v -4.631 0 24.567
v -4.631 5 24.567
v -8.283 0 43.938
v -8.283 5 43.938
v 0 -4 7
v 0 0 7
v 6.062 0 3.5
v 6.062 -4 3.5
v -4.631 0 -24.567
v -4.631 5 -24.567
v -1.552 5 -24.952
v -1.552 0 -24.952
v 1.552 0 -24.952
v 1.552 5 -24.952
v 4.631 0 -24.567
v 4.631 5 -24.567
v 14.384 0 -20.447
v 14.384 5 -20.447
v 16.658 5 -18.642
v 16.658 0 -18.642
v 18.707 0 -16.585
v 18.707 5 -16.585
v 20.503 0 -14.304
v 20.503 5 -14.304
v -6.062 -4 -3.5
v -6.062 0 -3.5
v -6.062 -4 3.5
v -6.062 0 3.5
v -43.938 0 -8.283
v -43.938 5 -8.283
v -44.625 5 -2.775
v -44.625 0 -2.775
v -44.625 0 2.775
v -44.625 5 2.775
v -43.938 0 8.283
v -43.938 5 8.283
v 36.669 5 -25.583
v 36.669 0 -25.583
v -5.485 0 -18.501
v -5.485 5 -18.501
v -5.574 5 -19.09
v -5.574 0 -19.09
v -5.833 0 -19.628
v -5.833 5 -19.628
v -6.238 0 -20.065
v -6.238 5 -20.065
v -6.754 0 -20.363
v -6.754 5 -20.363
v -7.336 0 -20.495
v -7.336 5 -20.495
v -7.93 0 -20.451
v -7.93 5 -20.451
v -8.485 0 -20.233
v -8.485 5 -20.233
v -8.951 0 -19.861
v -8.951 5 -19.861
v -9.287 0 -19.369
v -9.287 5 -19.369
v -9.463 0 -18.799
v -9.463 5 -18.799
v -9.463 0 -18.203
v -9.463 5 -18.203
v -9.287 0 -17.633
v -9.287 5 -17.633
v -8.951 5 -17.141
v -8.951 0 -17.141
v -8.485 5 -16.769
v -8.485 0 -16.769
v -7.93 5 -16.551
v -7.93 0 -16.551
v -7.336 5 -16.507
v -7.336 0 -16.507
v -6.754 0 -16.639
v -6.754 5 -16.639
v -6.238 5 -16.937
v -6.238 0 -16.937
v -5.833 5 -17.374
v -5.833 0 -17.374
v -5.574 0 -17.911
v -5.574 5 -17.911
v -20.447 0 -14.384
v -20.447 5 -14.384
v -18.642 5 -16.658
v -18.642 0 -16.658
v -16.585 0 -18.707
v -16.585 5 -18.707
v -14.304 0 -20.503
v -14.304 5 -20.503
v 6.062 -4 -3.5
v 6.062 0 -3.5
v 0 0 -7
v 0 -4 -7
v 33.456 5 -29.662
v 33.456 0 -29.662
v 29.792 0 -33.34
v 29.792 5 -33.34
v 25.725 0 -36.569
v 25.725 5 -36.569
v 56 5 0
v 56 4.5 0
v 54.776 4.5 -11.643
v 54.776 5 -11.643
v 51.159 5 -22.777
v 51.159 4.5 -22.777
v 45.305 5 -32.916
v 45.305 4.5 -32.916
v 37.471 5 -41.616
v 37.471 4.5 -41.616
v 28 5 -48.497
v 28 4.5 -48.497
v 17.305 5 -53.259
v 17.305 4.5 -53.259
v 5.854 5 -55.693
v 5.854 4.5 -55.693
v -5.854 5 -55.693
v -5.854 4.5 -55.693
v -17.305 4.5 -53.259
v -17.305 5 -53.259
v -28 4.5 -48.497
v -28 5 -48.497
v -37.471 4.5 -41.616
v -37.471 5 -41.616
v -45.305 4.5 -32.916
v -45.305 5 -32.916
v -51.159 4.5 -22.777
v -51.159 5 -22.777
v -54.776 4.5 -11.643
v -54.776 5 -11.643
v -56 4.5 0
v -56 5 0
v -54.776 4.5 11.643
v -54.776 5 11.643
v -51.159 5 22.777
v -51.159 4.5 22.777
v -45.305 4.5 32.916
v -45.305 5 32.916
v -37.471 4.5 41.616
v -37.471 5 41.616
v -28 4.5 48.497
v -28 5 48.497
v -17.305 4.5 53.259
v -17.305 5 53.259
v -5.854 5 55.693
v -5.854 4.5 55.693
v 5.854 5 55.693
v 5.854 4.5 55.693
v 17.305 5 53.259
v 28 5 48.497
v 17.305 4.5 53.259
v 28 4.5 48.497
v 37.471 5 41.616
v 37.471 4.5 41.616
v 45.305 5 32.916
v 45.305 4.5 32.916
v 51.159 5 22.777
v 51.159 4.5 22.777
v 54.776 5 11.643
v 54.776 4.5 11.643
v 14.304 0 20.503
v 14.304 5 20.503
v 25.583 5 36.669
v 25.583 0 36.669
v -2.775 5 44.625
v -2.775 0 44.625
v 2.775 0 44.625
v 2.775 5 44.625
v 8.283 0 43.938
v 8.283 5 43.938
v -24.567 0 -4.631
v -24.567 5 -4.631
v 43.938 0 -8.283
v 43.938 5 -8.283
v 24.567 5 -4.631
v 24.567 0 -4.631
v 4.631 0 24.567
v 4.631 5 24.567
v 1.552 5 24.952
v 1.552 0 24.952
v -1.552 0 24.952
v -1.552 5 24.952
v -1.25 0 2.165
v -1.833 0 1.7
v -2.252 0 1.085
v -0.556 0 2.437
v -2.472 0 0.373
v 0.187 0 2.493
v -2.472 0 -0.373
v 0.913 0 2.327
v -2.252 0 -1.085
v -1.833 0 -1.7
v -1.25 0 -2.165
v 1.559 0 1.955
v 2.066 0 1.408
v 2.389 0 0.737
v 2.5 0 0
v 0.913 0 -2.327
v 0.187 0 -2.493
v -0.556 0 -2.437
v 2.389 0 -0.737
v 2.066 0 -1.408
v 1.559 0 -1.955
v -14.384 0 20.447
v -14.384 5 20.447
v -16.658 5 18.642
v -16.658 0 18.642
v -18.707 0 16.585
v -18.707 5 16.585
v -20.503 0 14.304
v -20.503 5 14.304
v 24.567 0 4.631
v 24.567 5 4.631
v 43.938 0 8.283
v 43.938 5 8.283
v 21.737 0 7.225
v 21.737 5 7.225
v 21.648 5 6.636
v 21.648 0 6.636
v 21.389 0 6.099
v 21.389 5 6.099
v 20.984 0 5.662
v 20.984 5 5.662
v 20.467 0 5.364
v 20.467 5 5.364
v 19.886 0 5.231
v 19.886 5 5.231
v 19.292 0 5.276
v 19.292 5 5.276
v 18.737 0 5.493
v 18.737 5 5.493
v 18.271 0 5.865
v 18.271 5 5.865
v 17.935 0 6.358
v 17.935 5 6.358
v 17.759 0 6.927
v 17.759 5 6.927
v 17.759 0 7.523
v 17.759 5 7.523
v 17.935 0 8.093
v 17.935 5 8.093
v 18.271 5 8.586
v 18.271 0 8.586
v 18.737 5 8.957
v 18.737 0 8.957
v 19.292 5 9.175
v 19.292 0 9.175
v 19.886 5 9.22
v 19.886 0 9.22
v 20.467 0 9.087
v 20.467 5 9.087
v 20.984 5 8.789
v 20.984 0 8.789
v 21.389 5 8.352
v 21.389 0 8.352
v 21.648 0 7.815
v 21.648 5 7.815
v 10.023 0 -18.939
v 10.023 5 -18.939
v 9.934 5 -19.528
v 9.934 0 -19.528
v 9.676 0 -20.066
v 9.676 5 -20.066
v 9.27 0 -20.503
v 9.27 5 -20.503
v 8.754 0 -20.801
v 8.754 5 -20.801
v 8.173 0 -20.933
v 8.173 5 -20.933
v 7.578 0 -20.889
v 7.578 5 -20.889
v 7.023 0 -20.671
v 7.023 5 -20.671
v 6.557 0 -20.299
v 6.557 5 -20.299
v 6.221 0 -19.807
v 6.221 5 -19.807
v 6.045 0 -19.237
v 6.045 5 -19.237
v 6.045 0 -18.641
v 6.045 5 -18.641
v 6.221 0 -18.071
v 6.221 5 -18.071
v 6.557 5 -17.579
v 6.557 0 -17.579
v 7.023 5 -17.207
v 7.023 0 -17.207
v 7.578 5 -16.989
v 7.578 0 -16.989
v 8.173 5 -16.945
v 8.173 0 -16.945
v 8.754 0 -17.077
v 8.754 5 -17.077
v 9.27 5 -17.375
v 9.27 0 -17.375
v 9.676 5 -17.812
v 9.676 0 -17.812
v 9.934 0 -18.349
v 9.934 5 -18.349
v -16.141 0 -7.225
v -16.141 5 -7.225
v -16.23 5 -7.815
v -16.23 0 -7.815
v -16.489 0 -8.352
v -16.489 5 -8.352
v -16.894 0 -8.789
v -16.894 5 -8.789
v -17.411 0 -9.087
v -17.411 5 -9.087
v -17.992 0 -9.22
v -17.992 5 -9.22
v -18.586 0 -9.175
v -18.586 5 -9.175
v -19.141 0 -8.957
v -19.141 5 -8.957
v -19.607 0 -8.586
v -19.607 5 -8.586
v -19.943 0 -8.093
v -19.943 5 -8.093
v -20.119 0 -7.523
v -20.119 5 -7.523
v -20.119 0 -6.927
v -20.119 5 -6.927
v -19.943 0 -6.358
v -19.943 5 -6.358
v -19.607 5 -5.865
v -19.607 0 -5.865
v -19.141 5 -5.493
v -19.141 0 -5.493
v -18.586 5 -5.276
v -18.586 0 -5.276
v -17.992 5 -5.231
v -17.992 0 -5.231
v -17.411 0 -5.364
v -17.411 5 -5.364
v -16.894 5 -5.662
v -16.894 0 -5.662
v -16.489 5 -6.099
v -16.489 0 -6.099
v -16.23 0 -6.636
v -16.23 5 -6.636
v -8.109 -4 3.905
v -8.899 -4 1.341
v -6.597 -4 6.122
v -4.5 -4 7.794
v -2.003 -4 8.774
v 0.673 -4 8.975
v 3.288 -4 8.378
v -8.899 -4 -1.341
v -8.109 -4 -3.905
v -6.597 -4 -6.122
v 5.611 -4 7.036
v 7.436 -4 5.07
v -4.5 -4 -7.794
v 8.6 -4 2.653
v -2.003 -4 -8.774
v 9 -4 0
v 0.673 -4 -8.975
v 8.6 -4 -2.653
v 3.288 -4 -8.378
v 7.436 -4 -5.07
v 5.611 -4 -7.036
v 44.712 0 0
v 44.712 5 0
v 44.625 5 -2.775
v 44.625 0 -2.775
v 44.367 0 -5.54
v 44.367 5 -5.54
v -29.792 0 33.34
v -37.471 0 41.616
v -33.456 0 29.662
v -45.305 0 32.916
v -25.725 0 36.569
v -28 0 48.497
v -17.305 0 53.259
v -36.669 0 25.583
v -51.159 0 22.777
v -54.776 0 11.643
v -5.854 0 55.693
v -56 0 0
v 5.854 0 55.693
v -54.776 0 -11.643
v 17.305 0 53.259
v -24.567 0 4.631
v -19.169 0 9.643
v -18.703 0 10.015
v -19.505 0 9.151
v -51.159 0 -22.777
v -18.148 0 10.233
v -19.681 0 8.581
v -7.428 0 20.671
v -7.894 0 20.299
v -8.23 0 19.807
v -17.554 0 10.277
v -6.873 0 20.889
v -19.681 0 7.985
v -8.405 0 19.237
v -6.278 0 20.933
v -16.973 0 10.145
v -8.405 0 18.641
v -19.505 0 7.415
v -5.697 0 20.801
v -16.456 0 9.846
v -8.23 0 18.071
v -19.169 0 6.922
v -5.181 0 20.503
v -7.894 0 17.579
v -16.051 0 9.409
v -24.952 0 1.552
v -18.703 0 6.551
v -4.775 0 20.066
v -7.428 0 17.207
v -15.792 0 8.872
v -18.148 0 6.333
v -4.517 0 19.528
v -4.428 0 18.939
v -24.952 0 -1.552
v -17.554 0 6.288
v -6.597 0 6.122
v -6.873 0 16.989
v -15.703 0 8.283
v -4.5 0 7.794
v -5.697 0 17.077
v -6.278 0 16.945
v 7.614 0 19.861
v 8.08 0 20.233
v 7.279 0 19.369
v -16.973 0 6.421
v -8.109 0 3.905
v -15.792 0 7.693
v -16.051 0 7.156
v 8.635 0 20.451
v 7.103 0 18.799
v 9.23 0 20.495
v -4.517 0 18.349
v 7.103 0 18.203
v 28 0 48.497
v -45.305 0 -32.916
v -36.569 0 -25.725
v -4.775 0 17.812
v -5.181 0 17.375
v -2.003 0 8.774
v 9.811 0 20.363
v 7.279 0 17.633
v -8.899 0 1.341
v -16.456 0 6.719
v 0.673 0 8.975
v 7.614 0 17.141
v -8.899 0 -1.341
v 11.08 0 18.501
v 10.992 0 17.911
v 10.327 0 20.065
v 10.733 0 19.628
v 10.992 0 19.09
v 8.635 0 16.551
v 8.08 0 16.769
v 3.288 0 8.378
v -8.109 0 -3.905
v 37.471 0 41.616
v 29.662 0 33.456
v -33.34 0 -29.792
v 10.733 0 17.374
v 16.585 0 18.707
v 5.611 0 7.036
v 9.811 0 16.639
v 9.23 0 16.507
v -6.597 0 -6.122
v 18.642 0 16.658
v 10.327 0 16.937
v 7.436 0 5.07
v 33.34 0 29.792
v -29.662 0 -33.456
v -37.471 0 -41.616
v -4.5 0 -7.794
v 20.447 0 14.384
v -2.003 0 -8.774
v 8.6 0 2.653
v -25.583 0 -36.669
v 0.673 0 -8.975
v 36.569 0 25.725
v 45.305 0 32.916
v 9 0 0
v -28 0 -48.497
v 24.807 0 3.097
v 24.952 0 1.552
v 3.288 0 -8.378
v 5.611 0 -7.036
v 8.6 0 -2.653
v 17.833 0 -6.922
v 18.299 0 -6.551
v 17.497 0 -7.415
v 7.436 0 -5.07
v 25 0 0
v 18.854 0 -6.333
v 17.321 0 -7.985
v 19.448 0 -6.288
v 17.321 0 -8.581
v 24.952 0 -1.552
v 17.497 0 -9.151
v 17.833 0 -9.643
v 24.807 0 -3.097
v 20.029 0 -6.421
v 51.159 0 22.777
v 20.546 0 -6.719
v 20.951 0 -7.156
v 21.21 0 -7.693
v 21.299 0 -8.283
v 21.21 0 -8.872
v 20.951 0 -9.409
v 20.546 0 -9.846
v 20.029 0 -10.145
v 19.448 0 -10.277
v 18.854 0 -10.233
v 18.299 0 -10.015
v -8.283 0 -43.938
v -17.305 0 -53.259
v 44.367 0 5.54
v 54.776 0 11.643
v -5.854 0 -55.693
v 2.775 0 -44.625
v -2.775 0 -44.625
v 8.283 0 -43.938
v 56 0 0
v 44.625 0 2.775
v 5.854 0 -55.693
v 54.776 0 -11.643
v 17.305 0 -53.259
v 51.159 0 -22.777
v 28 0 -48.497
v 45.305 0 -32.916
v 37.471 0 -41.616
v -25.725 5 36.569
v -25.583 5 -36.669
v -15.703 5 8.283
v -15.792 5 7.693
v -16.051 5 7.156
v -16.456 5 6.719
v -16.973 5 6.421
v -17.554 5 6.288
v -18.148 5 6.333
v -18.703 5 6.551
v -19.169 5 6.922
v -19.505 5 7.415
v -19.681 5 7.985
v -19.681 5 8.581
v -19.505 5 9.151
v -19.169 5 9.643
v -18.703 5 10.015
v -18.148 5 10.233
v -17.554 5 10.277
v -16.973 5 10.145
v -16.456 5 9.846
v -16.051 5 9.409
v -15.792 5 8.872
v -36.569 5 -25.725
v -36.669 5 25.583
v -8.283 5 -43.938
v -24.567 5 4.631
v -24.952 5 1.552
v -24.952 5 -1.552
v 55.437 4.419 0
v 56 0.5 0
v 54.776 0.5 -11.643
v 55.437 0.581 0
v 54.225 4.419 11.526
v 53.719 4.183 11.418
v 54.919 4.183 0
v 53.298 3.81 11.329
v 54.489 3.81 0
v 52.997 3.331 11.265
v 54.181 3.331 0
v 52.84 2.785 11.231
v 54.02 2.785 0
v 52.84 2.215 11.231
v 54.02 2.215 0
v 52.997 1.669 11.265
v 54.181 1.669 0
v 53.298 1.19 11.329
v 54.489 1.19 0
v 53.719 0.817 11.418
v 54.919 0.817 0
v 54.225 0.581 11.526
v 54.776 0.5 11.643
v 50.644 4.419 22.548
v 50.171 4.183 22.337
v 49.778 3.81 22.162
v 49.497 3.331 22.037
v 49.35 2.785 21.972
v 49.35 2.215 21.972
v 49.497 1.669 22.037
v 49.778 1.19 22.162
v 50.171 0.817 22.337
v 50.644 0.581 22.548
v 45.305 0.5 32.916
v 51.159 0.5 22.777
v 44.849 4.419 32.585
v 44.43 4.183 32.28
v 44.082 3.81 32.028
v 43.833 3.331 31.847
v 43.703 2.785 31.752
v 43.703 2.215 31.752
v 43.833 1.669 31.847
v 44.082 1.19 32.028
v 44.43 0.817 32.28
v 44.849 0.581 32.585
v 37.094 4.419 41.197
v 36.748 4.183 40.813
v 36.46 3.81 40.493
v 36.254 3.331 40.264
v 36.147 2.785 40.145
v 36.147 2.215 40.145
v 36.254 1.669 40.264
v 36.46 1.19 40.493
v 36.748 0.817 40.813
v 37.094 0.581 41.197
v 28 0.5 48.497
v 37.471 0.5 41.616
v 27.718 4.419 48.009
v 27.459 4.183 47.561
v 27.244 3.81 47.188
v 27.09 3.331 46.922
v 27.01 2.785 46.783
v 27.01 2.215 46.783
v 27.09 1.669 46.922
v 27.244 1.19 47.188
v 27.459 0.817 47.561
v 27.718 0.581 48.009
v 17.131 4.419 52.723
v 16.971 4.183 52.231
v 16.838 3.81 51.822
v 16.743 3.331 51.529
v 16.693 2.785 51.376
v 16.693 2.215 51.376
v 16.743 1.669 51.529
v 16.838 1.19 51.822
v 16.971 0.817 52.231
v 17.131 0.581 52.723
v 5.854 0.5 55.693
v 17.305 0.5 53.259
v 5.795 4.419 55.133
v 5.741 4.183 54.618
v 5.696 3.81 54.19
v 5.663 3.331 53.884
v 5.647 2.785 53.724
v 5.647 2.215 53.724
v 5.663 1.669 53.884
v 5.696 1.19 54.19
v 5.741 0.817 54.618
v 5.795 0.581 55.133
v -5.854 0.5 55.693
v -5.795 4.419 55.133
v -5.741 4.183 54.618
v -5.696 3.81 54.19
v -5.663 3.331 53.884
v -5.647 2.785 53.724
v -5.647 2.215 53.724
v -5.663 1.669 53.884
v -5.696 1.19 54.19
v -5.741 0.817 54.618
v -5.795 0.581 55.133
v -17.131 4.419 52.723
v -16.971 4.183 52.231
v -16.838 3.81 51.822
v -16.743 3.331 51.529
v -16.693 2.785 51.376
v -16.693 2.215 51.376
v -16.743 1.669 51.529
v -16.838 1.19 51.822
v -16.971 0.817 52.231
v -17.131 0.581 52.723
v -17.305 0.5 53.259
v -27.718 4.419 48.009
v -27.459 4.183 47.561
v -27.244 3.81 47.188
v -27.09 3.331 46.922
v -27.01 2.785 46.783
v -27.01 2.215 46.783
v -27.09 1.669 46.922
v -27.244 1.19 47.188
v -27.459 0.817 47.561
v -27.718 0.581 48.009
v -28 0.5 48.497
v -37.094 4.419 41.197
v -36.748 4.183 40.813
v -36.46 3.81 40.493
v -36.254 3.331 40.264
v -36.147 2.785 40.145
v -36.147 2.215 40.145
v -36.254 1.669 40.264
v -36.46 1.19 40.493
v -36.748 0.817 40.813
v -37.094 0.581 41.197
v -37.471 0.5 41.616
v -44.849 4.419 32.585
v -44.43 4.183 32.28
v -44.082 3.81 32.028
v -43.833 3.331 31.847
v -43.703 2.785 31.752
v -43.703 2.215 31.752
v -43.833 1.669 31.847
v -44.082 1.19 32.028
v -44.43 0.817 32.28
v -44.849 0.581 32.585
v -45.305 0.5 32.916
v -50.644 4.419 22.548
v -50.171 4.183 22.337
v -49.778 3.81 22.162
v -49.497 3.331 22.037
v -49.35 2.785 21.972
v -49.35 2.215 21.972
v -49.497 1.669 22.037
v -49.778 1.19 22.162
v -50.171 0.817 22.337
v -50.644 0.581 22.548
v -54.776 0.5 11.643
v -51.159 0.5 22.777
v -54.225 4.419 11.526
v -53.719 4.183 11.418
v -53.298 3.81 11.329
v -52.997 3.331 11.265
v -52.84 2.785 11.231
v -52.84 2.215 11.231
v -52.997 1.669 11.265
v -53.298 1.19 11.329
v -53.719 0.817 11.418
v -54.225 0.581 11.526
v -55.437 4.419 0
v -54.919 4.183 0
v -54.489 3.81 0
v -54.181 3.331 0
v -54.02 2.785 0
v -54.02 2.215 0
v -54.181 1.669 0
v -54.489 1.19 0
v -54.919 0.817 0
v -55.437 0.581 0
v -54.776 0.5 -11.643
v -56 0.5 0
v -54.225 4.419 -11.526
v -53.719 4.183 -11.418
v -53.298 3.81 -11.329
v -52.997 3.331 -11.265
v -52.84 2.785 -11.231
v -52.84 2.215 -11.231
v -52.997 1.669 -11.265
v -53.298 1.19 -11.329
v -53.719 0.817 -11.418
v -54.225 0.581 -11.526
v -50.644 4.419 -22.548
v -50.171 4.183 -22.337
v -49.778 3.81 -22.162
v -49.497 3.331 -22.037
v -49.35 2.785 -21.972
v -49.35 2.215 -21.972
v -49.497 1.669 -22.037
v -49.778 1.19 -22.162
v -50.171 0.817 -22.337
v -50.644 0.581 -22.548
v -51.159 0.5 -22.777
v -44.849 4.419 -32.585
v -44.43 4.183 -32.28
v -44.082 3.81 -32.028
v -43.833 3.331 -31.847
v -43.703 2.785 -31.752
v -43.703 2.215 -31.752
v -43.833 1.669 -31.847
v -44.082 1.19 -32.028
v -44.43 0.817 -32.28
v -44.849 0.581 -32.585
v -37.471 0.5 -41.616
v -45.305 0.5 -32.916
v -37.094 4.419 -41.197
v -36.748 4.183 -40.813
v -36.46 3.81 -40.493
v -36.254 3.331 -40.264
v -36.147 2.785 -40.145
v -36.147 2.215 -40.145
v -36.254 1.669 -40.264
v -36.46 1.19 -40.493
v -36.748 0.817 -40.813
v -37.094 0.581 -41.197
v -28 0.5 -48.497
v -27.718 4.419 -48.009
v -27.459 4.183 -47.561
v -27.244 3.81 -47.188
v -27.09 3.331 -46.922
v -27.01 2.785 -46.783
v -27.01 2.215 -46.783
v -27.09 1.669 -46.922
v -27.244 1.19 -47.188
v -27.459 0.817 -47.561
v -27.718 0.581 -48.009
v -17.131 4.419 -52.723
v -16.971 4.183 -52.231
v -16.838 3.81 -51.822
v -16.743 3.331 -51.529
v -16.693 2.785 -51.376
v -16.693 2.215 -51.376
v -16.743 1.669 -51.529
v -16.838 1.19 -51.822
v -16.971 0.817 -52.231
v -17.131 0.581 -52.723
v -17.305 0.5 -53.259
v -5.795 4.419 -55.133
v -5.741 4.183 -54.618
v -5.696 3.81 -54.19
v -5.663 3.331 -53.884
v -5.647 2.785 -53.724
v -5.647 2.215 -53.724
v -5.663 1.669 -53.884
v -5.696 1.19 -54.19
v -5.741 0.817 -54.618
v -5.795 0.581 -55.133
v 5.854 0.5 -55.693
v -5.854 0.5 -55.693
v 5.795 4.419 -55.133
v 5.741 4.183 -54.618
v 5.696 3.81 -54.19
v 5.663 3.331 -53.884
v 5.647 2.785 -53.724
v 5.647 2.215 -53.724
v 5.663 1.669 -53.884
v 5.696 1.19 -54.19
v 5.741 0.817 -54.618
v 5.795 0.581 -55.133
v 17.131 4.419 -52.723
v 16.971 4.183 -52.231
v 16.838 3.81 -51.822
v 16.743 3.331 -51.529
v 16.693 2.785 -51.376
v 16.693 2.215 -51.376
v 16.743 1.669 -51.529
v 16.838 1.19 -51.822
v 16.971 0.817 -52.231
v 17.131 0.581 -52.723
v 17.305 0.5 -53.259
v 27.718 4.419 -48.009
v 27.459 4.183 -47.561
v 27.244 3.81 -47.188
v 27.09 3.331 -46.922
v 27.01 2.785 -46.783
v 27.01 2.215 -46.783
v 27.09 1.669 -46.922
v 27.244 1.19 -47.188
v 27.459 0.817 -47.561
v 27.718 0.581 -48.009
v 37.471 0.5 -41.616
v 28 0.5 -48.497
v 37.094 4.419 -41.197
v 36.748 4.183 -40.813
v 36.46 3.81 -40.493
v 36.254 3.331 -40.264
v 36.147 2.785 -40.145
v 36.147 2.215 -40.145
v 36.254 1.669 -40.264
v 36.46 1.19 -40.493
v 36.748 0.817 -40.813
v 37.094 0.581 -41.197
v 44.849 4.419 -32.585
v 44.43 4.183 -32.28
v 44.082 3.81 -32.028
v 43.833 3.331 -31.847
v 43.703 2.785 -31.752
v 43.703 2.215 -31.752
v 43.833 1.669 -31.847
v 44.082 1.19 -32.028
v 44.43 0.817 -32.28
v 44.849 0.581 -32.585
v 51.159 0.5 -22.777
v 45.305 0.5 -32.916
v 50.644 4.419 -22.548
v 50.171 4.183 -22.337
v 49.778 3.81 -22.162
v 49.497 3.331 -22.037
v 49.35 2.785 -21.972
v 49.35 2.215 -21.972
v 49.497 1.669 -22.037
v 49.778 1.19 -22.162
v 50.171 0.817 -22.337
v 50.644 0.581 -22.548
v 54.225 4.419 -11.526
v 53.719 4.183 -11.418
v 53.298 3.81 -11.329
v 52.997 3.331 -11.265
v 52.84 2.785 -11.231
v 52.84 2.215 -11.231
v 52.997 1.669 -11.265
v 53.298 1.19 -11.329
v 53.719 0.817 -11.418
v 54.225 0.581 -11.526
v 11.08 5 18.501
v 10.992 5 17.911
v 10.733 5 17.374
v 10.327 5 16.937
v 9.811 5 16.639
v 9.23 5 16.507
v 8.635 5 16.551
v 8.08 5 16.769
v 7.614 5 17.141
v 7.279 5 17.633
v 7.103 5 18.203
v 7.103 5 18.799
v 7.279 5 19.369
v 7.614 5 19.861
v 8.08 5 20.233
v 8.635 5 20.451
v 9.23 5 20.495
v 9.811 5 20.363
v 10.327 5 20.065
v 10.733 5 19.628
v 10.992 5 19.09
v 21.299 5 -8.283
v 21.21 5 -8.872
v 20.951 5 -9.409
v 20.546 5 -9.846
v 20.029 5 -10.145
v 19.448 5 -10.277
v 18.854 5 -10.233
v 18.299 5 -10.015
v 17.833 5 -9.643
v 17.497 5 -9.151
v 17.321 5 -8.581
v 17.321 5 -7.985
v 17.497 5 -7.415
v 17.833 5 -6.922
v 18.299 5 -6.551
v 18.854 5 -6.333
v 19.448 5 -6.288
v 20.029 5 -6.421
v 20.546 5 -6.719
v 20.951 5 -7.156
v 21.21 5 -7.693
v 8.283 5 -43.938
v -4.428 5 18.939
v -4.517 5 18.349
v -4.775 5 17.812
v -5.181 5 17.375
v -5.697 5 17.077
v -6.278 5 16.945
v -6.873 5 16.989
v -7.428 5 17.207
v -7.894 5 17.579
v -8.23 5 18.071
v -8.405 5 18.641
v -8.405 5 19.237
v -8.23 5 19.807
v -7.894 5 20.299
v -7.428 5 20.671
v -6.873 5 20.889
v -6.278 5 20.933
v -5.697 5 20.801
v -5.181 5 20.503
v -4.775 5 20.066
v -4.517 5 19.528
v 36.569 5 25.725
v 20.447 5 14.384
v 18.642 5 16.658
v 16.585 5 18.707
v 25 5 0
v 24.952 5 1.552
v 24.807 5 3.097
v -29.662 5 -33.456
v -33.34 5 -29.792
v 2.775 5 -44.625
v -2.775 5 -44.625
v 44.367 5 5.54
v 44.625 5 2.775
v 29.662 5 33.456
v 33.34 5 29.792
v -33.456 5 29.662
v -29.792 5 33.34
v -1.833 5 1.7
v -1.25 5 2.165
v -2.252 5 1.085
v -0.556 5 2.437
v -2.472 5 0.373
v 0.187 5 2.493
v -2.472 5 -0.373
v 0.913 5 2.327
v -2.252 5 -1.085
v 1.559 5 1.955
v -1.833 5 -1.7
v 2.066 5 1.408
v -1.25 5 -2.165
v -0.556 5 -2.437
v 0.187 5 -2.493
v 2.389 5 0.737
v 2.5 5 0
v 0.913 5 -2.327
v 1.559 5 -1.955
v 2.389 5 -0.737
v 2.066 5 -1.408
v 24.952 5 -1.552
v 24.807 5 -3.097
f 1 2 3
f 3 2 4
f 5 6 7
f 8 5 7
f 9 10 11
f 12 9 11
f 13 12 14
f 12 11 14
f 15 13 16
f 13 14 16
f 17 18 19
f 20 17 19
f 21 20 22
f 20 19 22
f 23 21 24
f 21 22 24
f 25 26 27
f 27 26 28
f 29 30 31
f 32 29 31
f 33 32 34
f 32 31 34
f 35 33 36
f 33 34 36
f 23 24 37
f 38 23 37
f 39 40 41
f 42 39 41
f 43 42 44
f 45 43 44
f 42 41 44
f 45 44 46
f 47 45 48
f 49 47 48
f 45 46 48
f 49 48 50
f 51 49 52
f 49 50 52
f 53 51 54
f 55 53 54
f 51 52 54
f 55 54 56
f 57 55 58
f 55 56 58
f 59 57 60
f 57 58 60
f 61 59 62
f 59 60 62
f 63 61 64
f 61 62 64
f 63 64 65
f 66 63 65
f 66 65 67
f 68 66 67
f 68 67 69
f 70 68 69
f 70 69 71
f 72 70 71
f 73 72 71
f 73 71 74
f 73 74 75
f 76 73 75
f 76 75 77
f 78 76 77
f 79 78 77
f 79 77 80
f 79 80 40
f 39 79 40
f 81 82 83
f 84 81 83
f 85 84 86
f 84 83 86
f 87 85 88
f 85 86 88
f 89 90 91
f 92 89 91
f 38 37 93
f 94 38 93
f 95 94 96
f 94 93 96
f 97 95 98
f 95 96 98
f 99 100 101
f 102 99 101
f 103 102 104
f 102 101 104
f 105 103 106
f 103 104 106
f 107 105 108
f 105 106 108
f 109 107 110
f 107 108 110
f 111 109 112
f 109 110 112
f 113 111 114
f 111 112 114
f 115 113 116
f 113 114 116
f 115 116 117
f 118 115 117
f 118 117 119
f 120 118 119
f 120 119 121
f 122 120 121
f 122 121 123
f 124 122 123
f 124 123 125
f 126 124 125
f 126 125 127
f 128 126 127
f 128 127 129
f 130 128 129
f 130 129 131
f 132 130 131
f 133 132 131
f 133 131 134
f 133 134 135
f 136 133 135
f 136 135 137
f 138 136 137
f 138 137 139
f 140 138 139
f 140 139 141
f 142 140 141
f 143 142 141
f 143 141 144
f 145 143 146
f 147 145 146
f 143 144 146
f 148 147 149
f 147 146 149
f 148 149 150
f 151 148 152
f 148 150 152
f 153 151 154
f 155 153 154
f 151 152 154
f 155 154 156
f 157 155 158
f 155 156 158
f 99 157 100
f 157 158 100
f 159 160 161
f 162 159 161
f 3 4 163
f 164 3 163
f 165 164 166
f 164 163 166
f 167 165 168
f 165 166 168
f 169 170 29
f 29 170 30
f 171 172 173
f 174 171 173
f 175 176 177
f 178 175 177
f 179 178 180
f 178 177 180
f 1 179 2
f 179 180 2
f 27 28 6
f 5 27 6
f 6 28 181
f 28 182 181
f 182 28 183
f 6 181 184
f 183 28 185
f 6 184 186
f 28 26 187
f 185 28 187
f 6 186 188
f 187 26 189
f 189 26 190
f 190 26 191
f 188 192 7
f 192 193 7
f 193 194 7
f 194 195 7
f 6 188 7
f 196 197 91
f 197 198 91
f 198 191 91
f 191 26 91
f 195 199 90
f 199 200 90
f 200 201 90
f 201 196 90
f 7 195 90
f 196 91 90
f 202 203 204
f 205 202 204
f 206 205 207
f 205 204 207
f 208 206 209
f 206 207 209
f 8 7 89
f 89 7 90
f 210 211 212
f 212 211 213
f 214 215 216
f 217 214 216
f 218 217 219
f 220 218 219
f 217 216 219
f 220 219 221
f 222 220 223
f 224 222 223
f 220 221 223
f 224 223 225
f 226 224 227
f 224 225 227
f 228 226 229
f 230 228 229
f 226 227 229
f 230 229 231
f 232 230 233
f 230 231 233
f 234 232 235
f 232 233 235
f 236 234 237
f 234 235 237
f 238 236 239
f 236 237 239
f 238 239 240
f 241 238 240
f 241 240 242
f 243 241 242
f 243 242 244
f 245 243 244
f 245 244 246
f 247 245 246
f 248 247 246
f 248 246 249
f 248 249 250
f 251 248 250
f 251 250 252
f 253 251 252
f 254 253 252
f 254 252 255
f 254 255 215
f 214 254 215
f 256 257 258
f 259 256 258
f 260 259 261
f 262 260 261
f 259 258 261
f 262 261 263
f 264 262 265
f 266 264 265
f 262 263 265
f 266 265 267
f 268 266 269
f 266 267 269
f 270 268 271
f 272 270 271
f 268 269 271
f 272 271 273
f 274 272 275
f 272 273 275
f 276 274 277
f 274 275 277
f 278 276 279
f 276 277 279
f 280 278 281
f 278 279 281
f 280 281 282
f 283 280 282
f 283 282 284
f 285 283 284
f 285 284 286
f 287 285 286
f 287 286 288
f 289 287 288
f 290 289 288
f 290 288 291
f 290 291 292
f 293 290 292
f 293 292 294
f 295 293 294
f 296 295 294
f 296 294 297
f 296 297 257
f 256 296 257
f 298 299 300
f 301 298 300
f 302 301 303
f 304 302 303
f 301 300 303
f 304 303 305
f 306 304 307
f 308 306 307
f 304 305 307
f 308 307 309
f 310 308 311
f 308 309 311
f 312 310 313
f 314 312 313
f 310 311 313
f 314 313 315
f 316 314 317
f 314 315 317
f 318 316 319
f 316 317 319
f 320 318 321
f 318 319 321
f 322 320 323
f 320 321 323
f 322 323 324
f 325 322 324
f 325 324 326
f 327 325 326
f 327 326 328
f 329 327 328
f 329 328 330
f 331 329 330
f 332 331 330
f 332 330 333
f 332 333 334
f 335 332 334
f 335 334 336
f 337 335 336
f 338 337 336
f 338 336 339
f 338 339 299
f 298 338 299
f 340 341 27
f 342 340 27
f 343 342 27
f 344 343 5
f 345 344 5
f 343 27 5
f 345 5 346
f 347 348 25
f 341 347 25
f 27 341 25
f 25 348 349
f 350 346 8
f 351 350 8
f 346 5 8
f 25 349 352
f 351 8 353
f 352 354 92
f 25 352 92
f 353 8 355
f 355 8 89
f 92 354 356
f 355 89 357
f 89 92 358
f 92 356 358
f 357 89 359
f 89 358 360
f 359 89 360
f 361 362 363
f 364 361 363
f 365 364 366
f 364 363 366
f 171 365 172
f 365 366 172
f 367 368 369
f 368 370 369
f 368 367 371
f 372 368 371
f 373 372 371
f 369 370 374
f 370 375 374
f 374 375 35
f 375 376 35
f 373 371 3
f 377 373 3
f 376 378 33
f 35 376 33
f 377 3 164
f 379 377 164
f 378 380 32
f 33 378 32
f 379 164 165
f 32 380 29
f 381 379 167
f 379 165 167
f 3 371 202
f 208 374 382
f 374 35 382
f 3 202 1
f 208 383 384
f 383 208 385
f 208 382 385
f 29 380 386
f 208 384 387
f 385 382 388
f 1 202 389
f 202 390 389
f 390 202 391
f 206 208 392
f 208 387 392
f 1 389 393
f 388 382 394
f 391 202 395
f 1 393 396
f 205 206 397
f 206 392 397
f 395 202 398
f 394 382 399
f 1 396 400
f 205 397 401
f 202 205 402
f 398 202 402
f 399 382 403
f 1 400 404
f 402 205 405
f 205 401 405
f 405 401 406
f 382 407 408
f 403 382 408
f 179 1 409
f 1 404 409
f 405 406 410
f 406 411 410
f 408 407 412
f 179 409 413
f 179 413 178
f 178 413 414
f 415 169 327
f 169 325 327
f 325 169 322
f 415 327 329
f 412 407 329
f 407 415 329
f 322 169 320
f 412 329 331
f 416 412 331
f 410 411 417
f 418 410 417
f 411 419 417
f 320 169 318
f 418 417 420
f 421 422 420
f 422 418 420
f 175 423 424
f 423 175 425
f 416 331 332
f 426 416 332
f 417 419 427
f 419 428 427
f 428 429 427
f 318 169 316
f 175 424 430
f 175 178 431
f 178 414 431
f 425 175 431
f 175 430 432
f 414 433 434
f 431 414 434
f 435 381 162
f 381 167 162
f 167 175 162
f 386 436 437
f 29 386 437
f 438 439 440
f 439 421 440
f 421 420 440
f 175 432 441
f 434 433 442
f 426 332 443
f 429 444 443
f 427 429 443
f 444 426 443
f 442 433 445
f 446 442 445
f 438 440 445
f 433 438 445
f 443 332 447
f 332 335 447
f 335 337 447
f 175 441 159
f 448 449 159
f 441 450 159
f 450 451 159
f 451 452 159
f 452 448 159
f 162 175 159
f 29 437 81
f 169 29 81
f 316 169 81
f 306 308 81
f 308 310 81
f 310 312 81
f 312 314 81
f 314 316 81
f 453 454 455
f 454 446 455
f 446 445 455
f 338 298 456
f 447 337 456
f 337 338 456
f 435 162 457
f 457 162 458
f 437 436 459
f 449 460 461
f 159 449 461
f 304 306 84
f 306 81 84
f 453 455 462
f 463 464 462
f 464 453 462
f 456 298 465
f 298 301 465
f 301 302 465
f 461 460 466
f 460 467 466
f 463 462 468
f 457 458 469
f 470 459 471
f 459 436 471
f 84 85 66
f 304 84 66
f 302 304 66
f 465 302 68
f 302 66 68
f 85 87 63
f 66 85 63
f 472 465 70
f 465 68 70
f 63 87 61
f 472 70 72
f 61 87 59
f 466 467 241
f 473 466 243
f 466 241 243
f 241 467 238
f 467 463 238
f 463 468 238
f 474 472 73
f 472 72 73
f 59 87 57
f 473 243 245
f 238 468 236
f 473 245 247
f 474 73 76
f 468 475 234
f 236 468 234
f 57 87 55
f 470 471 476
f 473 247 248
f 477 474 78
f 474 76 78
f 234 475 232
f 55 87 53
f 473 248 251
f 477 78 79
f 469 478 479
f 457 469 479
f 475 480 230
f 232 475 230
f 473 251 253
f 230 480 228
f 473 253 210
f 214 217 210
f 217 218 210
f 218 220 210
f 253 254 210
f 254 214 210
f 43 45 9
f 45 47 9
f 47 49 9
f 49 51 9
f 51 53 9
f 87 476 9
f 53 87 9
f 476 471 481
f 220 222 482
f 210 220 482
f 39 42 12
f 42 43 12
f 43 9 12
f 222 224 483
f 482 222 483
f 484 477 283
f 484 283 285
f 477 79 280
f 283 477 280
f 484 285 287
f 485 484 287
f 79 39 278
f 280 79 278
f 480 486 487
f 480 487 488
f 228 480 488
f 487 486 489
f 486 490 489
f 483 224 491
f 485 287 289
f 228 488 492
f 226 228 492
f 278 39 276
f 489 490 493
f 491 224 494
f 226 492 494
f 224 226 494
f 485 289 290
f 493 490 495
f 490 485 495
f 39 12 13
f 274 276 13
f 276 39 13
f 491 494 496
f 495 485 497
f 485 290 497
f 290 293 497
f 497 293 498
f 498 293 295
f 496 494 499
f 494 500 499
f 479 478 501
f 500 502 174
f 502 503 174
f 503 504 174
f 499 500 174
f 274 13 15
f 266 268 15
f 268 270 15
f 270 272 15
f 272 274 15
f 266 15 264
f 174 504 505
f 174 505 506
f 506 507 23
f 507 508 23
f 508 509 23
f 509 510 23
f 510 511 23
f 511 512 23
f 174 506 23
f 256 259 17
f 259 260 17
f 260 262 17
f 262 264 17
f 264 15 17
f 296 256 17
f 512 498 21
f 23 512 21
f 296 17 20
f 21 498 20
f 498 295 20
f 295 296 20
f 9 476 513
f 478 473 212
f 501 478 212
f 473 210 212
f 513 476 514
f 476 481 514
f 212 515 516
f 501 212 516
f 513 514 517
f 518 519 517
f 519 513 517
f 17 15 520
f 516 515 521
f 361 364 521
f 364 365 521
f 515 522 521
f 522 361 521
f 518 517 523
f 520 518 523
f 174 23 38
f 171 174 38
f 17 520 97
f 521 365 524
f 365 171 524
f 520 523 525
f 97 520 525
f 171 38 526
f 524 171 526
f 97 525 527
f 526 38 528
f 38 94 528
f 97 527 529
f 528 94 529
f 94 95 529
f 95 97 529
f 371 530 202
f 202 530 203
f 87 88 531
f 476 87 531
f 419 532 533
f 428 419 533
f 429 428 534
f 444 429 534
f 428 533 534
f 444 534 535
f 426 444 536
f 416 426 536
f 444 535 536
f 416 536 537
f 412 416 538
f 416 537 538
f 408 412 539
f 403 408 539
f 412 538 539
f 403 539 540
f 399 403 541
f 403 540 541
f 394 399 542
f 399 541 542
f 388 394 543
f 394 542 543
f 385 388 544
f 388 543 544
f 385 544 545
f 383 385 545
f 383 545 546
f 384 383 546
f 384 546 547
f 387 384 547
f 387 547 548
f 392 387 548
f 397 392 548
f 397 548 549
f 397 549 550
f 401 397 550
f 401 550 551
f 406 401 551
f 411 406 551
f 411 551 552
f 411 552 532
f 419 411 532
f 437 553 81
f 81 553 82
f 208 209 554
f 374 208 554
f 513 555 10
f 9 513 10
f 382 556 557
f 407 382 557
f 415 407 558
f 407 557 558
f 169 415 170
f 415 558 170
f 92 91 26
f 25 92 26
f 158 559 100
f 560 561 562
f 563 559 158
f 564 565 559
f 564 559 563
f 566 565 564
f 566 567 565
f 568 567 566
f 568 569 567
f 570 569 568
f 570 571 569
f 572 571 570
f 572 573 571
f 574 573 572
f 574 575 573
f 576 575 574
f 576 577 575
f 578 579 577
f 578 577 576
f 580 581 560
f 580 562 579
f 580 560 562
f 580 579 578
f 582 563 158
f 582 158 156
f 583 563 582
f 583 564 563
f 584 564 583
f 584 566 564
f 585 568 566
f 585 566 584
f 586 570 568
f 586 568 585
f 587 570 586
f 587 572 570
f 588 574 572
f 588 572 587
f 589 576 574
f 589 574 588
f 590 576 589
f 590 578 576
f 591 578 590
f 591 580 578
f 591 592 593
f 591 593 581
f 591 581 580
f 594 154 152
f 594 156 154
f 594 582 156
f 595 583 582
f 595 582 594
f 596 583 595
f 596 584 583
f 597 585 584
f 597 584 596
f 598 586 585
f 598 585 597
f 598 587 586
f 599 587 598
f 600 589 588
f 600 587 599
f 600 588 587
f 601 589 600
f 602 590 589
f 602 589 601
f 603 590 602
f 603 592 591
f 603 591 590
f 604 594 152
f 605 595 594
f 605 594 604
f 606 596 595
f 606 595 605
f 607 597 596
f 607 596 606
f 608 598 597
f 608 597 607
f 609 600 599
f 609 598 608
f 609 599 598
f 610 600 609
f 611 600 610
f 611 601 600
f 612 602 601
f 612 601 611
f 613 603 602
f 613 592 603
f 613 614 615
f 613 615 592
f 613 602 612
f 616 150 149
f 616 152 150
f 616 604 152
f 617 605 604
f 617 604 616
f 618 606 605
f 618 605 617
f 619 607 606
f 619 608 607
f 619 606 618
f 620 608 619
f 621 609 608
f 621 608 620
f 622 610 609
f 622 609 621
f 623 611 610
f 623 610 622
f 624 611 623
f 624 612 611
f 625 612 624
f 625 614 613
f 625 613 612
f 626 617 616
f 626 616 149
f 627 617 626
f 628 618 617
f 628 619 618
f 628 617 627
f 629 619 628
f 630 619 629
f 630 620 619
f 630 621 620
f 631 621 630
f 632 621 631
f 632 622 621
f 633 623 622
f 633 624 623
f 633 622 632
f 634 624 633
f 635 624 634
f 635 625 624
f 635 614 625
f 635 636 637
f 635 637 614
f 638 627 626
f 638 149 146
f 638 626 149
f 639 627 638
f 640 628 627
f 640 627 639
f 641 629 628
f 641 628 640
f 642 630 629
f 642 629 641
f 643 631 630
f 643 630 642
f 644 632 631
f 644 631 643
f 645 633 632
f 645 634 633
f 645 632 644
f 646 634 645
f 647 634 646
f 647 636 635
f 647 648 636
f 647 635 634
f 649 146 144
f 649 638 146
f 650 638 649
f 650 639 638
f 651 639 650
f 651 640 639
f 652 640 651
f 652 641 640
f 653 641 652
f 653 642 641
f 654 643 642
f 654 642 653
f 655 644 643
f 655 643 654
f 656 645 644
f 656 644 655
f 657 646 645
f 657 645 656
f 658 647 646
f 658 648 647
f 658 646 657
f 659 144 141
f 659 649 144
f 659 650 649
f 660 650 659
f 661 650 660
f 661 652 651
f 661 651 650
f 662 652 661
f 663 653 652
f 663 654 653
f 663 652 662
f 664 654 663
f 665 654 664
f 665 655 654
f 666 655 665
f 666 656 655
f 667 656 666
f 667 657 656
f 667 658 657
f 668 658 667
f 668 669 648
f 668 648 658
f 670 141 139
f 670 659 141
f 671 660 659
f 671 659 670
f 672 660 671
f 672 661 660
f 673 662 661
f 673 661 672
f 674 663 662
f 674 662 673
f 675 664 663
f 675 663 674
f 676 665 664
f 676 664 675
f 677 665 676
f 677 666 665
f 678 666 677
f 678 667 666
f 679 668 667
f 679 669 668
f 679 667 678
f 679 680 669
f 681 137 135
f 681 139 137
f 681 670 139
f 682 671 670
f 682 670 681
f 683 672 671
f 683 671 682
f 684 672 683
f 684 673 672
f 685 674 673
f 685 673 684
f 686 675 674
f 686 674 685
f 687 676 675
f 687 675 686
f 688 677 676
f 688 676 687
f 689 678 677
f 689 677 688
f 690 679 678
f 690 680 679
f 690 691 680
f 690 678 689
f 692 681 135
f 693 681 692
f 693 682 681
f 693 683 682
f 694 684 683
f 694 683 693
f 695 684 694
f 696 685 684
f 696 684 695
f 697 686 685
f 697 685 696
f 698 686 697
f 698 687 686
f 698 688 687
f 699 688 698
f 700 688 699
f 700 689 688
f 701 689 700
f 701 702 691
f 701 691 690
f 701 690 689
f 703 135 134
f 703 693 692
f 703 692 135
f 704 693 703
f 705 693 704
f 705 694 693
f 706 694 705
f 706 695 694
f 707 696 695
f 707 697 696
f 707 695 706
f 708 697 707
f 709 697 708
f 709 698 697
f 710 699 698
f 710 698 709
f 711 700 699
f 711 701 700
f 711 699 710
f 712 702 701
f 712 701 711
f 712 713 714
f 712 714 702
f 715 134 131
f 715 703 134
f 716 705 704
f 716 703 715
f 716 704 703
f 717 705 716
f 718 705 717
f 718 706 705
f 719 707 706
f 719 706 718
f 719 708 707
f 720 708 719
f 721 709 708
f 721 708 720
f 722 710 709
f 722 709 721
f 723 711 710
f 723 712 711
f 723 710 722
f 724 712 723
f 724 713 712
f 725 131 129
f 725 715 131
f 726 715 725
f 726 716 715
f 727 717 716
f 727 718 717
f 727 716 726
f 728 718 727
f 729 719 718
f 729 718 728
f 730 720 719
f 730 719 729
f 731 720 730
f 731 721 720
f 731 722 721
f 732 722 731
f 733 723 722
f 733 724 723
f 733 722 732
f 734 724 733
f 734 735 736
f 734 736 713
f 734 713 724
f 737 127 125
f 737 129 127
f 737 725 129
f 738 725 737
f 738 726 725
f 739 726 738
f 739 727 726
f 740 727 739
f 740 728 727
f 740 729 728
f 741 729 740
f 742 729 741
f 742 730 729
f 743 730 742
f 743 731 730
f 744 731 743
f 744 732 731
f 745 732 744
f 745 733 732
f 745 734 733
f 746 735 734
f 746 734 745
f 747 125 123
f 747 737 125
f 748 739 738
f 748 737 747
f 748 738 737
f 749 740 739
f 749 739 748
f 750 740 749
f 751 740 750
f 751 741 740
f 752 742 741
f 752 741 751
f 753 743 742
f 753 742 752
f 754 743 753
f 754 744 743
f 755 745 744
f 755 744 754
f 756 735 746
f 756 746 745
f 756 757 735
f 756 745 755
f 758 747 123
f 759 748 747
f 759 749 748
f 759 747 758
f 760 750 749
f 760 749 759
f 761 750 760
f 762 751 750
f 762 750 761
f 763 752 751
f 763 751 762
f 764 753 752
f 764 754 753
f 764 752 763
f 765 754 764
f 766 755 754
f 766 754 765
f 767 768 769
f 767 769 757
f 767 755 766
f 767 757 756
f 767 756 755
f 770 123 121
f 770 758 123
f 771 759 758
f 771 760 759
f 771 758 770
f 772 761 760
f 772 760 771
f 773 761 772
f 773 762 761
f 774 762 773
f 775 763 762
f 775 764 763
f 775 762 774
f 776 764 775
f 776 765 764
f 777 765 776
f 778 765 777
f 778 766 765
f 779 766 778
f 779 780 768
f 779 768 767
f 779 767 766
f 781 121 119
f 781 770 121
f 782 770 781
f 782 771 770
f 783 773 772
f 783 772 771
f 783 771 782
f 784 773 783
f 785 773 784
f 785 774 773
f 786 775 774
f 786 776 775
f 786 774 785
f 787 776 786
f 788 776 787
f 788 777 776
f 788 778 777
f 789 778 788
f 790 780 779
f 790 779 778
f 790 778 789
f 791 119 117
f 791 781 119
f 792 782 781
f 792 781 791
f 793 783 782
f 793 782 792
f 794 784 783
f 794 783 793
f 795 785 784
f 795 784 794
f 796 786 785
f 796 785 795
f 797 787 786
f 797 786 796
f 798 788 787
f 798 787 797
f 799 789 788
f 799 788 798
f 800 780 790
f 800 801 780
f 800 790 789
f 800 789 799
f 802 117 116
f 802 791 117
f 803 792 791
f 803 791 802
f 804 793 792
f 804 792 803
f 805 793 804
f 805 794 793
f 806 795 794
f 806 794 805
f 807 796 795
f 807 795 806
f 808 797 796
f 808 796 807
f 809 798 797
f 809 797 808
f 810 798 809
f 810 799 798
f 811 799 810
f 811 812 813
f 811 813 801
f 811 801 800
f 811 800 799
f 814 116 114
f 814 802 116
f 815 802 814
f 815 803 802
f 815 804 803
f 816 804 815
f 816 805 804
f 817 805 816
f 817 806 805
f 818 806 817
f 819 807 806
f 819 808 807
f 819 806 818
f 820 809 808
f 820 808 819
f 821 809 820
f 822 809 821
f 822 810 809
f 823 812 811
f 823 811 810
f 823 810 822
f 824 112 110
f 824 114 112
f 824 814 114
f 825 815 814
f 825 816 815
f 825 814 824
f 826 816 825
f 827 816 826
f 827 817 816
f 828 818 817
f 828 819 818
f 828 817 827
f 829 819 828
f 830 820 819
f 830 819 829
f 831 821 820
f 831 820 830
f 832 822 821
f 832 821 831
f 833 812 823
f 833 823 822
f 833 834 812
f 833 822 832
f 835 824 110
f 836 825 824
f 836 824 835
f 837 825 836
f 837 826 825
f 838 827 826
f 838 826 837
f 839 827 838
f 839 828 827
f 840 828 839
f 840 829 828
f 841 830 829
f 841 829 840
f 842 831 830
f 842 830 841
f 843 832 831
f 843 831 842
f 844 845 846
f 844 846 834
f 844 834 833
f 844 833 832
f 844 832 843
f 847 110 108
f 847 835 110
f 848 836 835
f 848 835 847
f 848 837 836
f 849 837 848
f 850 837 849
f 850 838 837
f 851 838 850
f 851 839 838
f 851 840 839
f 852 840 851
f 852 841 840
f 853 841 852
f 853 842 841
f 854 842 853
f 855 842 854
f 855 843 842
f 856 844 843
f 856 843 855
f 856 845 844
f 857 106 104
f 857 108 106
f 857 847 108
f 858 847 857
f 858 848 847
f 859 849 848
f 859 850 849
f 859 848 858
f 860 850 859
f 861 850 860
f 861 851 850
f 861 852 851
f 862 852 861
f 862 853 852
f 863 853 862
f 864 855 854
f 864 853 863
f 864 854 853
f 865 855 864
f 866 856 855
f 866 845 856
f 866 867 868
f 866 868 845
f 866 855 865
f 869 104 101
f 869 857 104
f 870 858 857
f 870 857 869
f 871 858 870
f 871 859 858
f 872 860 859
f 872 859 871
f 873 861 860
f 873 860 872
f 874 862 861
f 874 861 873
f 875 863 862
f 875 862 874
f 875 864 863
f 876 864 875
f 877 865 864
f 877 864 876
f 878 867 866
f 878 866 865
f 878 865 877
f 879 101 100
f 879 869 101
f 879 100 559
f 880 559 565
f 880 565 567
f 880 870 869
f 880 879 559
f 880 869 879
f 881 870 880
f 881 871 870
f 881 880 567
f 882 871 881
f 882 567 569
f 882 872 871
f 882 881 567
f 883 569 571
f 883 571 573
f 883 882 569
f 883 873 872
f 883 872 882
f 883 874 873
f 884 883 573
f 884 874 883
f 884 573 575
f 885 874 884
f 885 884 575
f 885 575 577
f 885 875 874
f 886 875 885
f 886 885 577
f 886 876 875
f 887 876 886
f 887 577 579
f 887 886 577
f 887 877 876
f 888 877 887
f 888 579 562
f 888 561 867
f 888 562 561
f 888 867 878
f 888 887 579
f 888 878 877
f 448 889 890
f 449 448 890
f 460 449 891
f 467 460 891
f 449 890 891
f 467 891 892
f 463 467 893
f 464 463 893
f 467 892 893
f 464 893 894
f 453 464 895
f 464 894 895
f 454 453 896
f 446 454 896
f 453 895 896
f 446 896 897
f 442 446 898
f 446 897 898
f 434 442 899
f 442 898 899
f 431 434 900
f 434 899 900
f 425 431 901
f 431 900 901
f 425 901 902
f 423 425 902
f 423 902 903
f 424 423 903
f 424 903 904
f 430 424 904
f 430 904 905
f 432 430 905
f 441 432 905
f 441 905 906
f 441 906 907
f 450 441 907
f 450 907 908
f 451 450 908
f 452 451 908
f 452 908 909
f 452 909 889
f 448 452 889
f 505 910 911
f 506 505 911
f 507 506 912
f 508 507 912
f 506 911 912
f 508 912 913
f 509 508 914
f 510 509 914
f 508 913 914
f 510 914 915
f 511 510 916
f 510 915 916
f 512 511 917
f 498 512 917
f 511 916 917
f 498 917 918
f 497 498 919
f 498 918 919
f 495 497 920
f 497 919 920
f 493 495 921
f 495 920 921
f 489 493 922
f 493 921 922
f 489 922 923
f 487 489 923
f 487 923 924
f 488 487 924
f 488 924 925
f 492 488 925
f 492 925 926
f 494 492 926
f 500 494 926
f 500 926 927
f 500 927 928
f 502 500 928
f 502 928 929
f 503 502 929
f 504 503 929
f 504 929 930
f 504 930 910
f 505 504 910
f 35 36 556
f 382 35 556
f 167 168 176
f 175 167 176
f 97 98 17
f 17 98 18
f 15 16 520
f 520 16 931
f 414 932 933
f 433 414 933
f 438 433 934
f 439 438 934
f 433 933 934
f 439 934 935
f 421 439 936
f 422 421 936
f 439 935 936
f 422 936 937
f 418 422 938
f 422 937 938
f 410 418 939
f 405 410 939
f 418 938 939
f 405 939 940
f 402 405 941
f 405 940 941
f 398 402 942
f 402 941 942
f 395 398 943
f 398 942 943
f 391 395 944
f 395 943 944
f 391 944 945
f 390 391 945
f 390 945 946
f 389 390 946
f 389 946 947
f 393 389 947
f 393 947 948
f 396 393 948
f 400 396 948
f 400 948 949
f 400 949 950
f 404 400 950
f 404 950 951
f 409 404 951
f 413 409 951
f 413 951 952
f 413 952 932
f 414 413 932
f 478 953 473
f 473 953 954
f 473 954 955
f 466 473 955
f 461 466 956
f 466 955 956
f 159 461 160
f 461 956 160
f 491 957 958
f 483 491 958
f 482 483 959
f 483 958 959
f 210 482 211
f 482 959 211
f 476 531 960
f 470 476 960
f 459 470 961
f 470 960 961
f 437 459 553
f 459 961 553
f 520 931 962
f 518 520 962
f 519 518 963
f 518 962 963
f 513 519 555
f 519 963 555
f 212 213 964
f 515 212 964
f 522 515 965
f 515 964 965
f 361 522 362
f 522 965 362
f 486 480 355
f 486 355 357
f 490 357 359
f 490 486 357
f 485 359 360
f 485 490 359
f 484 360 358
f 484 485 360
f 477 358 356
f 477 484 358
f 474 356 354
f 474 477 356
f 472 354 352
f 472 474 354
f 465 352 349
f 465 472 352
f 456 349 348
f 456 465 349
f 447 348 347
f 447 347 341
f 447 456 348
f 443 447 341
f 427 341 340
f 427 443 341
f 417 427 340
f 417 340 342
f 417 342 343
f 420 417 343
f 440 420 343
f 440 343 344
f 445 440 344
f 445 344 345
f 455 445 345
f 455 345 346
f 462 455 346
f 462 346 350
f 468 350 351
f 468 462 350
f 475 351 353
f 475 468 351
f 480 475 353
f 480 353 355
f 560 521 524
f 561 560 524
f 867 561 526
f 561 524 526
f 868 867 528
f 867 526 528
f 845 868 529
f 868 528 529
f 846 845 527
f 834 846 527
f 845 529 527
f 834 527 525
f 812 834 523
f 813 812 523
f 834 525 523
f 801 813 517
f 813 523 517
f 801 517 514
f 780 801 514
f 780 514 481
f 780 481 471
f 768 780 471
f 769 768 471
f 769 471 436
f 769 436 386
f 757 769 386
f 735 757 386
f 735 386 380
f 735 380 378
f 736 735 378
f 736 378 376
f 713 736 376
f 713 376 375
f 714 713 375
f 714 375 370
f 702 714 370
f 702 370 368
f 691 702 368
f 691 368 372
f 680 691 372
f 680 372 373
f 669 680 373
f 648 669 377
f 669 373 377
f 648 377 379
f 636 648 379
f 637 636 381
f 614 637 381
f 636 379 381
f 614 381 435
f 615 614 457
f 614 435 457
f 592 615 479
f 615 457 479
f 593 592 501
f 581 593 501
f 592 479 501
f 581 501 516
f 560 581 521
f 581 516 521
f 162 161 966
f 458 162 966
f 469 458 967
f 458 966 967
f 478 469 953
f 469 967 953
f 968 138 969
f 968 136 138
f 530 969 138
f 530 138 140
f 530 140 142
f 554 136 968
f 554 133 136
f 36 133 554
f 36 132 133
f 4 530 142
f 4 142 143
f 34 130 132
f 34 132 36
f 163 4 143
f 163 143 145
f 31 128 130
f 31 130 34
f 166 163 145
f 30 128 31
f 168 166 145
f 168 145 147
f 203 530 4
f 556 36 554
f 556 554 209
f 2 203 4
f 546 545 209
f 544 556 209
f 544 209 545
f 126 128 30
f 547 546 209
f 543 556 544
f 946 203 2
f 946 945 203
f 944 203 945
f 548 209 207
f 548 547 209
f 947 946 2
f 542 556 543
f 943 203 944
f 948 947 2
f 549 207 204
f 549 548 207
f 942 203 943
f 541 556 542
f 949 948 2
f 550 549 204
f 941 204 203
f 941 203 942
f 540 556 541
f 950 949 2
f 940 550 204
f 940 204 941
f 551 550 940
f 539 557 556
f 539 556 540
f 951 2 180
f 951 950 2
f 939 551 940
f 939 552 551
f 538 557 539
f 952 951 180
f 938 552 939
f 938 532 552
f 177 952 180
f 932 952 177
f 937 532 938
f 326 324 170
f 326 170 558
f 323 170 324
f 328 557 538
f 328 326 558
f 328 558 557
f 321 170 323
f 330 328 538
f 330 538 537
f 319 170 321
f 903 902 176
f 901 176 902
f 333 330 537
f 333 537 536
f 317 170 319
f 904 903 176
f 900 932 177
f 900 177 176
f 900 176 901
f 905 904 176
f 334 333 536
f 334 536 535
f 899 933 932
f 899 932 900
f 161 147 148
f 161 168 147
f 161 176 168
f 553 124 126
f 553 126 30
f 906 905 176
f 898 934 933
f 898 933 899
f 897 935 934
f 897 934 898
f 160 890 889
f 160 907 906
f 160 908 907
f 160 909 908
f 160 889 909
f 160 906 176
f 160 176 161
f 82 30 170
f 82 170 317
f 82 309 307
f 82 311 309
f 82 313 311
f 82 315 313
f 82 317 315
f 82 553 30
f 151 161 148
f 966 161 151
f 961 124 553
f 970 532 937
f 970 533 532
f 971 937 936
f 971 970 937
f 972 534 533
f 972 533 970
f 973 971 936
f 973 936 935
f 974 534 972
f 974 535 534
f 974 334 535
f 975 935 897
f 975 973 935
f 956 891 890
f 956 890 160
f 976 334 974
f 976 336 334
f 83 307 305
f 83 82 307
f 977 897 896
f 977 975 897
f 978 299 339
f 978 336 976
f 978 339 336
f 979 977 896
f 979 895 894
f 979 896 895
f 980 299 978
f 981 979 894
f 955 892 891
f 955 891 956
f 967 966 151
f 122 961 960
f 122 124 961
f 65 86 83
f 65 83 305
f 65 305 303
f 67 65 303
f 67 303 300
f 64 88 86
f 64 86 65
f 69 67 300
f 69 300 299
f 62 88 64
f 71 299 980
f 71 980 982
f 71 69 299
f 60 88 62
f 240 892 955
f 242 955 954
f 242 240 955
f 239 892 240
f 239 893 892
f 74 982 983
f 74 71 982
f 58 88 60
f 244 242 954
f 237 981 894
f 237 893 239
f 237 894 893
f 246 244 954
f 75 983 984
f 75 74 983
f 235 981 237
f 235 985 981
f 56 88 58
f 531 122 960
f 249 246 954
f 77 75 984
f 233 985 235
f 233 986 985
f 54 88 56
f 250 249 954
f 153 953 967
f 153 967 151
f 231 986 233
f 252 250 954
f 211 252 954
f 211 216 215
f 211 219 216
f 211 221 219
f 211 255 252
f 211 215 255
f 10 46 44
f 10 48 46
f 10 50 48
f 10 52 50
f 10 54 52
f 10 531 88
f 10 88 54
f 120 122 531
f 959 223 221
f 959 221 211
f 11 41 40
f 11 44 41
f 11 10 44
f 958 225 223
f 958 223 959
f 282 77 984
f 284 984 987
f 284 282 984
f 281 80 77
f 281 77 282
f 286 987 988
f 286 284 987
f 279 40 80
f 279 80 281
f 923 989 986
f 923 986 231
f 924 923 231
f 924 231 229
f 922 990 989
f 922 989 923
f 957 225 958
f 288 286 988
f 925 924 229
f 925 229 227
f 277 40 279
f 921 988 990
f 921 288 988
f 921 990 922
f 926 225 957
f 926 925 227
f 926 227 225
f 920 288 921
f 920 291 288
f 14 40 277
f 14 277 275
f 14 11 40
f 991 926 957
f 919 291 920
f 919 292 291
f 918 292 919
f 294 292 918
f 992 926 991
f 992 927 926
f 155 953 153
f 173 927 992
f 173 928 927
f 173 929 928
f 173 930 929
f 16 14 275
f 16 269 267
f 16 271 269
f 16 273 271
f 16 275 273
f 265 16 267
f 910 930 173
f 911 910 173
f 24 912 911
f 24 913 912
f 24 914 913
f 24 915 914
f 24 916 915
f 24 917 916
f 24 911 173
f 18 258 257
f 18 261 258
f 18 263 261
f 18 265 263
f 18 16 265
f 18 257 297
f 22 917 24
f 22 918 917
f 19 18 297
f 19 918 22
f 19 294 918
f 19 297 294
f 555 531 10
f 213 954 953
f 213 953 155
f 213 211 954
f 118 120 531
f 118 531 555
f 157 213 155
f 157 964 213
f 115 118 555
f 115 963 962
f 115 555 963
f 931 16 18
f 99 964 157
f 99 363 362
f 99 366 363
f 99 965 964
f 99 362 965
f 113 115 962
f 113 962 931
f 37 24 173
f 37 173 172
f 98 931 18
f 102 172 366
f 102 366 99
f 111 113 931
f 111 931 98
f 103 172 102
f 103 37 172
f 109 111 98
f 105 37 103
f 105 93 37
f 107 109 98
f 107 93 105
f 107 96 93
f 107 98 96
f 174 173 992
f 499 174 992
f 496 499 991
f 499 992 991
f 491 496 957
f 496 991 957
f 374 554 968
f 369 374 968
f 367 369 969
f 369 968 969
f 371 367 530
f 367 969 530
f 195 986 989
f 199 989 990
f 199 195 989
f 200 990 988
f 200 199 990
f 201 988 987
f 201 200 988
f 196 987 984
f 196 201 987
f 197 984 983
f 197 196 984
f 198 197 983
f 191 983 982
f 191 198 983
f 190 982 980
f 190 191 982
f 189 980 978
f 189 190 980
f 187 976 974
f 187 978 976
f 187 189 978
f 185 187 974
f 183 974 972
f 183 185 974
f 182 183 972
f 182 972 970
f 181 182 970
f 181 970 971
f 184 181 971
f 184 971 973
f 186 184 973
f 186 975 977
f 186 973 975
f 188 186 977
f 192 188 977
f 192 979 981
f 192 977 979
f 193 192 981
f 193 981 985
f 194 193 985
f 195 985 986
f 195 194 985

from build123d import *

# Parameters (mm, degrees)
SKETCH6_R                = 56
BOSS_EXTRUDE3_DEPTH      = 5
CUT_EXTRUDE4_DEPTH       = 1
CUT_EXTRUDE4_DEPTH_BACK  = 6
SKETCH7_8_R              = 2
CUT_EXTRUDE5_DEPTH       = 1
CUT_EXTRUDE5_DEPTH_BACK  = 6
SKETCH10_R               = 2
SKETCH11_R               = 2.5
CUT_EXTRUDE14_DEPTH      = 6
CUT_EXTRUDE14_DEPTH_BACK = 5
SKETCH12_R               = 9
BOSS_EXTRUDE4_DEPTH      = 4


with BuildPart() as part:
    # Sketch6 → Boss-Extrude3 (new body)
    with BuildSketch(Plane(origin=(0, 0, 0), x_dir=(1, 0, 0), z_dir=(0, 1, 0))):
        Circle(SKETCH6_R)
    extrude(amount=BOSS_EXTRUDE3_DEPTH)

    # Sketch7 → Cut-Extrude4 (cut, two sides)
    with BuildSketch(Plane(origin=(0, 5, 0), x_dir=(1, 0, 0), z_dir=(0, 1, 0))) as cut_extrude4_sk:
        with BuildLine():
            Line((20.503283661, 14.304382514), (36.669318151, 25.582826732))
            ThreePointArc((36.669318151, 25.582826732), (31.677302024, 31.554214517), (25.725394502, 36.569440726))
            Line((25.725394502, 36.569440726), (14.384097861, 20.447438195))
            ThreePointArc((14.384097861, 20.447438195), (17.712047613, 17.64322446), (20.503283661, 14.304382514))
        make_face()
        with BuildLine():
            Line((4.631236844, 24.567288114), (8.282785337, 43.937630618))
            ThreePointArc((8.282785337, 43.937630618), (0, 44.711518844), (-8.282785337, 43.937630618))
            Line((-8.282785337, 43.937630618), (-4.631236844, 24.567288114))
            ThreePointArc((-4.631236844, 24.567288114), (0, 25), (4.631236844, 24.567288114))
        make_face()
        with BuildLine():
            Line((-14.304382514, 20.503283661), (-25.582826732, 36.669318151))
            ThreePointArc((-25.582826732, 36.669318151), (-31.554214517, 31.677302024), (-36.569440726, 25.725394502))
            Line((-36.569440726, 25.725394502), (-20.447438195, 14.384097861))
            ThreePointArc((-20.447438195, 14.384097861), (-17.64322446, 17.712047613), (-14.304382514, 20.503283661))
        make_face()
        with BuildLine():
            Line((-24.567288114, 4.631236844), (-43.937630618, 8.282785337))
            ThreePointArc((-43.937630618, 8.282785337), (-44.711518844, 0), (-43.937630618, -8.282785337))
            Line((-43.937630618, -8.282785337), (-24.567288114, -4.631236844))
            ThreePointArc((-24.567288114, -4.631236844), (-25, 0), (-24.567288114, 4.631236844))
        make_face()
        with BuildLine():
            ThreePointArc((-36.669318151, -25.582826732), (-31.677302024, -31.554214517), (-25.725394502, -36.569440726))
            Line((-25.725394502, -36.569440726), (-14.384097861, -20.447438195))
            ThreePointArc((-14.384097861, -20.447438195), (-17.712047613, -17.64322446), (-20.503283661, -14.304382514))
            Line((-20.503283661, -14.304382514), (-36.669318151, -25.582826732))
        make_face()
        with BuildLine():
            ThreePointArc((-8.282785337, -43.937630618), (0, -44.711518844), (8.282785337, -43.937630618))
            Line((8.282785337, -43.937630618), (4.631236844, -24.567288114))
            ThreePointArc((4.631236844, -24.567288114), (0, -25), (-4.631236844, -24.567288114))
            Line((-4.631236844, -24.567288114), (-8.282785337, -43.937630618))
        make_face()
        with BuildLine():
            ThreePointArc((25.582826732, -36.669318151), (31.554214517, -31.677302024), (36.569440726, -25.725394502))
            Line((36.569440726, -25.725394502), (20.447438195, -14.384097861))
            ThreePointArc((20.447438195, -14.384097861), (17.64322446, -17.712047613), (14.304382514, -20.503283661))
            Line((14.304382514, -20.503283661), (25.582826732, -36.669318151))
        make_face()
        with BuildLine():
            ThreePointArc((44.711518844, 0), (44.517626378, 4.159430127), (43.937630618, 8.282785337))
            Line((43.937630618, 8.282785337), (24.567288114, 4.631236844))
            ThreePointArc((24.567288114, 4.631236844), (24.891586961, 2.325703887), (25, 0))
            ThreePointArc((25, 0), (24.891586961, -2.325703887), (24.567288114, -4.631236844))
            Line((24.567288114, -4.631236844), (43.937630618, -8.282785337))
            ThreePointArc((43.937630618, -8.282785337), (44.517626378, -4.159430127), (44.711518844, 0))
        make_face()
    extrude(amount=CUT_EXTRUDE4_DEPTH, mode=Mode.SUBTRACT)
    extrude(cut_extrude4_sk.sketch, amount=-CUT_EXTRUDE4_DEPTH_BACK, mode=Mode.SUBTRACT)

    # Sketch7<8> → Cut-Extrude5 (cut, two sides)
    with BuildSketch(Plane(origin=(0, 5, 0), x_dir=(1, 0, 0), z_dir=(0, 1, 0))) as cut_extrude5_sk:
        with Locations((19.298680627, 8.282785337)):
            Circle(SKETCH7_8_R)
        with Locations((19.736681401, -7.225357928)):
            Circle(SKETCH7_8_R)
        with Locations((8.023054044, 18.938985285)):
            Circle(SKETCH7_8_R)
        with Locations((9.080481453, -18.500984511)):
            Circle(SKETCH7_8_R)
        with Locations((-7.485089221, 18.500984511)):
            Circle(SKETCH7_8_R)
        with Locations((-6.427661812, -18.938985285)):
            Circle(SKETCH7_8_R)
        with Locations((-18.141289169, 7.225357928)):
            Circle(SKETCH7_8_R)
        with Locations((-17.703288395, -8.282785337)):
            Circle(SKETCH7_8_R)
    extrude(amount=CUT_EXTRUDE5_DEPTH, mode=Mode.SUBTRACT)
    extrude(cut_extrude5_sk.sketch, amount=-CUT_EXTRUDE5_DEPTH_BACK, mode=Mode.SUBTRACT)

    # Sketch10 → Cut-Revolve1 (revolve, cut)
    with BuildSketch(Plane.XY):
        with Locations((56, 2.5)):
            Circle(SKETCH10_R)
    revolve(axis=Axis((0, 40.614262211, 0), (0, -1, 0)), mode=Mode.SUBTRACT)

    # Sketch11 → Cut-Extrude14 (cut, two sides)
    with BuildSketch(Plane(origin=(0, 0, 0), x_dir=(1, 0, 0), z_dir=(0, 1, 0))) as cut_extrude14_sk:
        Circle(SKETCH11_R)
    extrude(amount=CUT_EXTRUDE14_DEPTH, mode=Mode.SUBTRACT)
    extrude(cut_extrude14_sk.sketch, amount=-CUT_EXTRUDE14_DEPTH_BACK, mode=Mode.SUBTRACT)

    # Sketch12 → Boss-Extrude4 (add)
    with BuildSketch(Plane(origin=(0, 0, 0), x_dir=(1, 0, 0), z_dir=(0, 1, 0))):
        Circle(SKETCH12_R)
        Polygon((0, 7), (-6.062177826, 3.5), (-6.062177826, -3.5), (0, -7), (6.062177826, -3.5), (6.062177826, 3.5), align=None, mode=Mode.SUBTRACT)
    extrude(amount=-BOSS_EXTRUDE4_DEPTH)


solid = part.part
